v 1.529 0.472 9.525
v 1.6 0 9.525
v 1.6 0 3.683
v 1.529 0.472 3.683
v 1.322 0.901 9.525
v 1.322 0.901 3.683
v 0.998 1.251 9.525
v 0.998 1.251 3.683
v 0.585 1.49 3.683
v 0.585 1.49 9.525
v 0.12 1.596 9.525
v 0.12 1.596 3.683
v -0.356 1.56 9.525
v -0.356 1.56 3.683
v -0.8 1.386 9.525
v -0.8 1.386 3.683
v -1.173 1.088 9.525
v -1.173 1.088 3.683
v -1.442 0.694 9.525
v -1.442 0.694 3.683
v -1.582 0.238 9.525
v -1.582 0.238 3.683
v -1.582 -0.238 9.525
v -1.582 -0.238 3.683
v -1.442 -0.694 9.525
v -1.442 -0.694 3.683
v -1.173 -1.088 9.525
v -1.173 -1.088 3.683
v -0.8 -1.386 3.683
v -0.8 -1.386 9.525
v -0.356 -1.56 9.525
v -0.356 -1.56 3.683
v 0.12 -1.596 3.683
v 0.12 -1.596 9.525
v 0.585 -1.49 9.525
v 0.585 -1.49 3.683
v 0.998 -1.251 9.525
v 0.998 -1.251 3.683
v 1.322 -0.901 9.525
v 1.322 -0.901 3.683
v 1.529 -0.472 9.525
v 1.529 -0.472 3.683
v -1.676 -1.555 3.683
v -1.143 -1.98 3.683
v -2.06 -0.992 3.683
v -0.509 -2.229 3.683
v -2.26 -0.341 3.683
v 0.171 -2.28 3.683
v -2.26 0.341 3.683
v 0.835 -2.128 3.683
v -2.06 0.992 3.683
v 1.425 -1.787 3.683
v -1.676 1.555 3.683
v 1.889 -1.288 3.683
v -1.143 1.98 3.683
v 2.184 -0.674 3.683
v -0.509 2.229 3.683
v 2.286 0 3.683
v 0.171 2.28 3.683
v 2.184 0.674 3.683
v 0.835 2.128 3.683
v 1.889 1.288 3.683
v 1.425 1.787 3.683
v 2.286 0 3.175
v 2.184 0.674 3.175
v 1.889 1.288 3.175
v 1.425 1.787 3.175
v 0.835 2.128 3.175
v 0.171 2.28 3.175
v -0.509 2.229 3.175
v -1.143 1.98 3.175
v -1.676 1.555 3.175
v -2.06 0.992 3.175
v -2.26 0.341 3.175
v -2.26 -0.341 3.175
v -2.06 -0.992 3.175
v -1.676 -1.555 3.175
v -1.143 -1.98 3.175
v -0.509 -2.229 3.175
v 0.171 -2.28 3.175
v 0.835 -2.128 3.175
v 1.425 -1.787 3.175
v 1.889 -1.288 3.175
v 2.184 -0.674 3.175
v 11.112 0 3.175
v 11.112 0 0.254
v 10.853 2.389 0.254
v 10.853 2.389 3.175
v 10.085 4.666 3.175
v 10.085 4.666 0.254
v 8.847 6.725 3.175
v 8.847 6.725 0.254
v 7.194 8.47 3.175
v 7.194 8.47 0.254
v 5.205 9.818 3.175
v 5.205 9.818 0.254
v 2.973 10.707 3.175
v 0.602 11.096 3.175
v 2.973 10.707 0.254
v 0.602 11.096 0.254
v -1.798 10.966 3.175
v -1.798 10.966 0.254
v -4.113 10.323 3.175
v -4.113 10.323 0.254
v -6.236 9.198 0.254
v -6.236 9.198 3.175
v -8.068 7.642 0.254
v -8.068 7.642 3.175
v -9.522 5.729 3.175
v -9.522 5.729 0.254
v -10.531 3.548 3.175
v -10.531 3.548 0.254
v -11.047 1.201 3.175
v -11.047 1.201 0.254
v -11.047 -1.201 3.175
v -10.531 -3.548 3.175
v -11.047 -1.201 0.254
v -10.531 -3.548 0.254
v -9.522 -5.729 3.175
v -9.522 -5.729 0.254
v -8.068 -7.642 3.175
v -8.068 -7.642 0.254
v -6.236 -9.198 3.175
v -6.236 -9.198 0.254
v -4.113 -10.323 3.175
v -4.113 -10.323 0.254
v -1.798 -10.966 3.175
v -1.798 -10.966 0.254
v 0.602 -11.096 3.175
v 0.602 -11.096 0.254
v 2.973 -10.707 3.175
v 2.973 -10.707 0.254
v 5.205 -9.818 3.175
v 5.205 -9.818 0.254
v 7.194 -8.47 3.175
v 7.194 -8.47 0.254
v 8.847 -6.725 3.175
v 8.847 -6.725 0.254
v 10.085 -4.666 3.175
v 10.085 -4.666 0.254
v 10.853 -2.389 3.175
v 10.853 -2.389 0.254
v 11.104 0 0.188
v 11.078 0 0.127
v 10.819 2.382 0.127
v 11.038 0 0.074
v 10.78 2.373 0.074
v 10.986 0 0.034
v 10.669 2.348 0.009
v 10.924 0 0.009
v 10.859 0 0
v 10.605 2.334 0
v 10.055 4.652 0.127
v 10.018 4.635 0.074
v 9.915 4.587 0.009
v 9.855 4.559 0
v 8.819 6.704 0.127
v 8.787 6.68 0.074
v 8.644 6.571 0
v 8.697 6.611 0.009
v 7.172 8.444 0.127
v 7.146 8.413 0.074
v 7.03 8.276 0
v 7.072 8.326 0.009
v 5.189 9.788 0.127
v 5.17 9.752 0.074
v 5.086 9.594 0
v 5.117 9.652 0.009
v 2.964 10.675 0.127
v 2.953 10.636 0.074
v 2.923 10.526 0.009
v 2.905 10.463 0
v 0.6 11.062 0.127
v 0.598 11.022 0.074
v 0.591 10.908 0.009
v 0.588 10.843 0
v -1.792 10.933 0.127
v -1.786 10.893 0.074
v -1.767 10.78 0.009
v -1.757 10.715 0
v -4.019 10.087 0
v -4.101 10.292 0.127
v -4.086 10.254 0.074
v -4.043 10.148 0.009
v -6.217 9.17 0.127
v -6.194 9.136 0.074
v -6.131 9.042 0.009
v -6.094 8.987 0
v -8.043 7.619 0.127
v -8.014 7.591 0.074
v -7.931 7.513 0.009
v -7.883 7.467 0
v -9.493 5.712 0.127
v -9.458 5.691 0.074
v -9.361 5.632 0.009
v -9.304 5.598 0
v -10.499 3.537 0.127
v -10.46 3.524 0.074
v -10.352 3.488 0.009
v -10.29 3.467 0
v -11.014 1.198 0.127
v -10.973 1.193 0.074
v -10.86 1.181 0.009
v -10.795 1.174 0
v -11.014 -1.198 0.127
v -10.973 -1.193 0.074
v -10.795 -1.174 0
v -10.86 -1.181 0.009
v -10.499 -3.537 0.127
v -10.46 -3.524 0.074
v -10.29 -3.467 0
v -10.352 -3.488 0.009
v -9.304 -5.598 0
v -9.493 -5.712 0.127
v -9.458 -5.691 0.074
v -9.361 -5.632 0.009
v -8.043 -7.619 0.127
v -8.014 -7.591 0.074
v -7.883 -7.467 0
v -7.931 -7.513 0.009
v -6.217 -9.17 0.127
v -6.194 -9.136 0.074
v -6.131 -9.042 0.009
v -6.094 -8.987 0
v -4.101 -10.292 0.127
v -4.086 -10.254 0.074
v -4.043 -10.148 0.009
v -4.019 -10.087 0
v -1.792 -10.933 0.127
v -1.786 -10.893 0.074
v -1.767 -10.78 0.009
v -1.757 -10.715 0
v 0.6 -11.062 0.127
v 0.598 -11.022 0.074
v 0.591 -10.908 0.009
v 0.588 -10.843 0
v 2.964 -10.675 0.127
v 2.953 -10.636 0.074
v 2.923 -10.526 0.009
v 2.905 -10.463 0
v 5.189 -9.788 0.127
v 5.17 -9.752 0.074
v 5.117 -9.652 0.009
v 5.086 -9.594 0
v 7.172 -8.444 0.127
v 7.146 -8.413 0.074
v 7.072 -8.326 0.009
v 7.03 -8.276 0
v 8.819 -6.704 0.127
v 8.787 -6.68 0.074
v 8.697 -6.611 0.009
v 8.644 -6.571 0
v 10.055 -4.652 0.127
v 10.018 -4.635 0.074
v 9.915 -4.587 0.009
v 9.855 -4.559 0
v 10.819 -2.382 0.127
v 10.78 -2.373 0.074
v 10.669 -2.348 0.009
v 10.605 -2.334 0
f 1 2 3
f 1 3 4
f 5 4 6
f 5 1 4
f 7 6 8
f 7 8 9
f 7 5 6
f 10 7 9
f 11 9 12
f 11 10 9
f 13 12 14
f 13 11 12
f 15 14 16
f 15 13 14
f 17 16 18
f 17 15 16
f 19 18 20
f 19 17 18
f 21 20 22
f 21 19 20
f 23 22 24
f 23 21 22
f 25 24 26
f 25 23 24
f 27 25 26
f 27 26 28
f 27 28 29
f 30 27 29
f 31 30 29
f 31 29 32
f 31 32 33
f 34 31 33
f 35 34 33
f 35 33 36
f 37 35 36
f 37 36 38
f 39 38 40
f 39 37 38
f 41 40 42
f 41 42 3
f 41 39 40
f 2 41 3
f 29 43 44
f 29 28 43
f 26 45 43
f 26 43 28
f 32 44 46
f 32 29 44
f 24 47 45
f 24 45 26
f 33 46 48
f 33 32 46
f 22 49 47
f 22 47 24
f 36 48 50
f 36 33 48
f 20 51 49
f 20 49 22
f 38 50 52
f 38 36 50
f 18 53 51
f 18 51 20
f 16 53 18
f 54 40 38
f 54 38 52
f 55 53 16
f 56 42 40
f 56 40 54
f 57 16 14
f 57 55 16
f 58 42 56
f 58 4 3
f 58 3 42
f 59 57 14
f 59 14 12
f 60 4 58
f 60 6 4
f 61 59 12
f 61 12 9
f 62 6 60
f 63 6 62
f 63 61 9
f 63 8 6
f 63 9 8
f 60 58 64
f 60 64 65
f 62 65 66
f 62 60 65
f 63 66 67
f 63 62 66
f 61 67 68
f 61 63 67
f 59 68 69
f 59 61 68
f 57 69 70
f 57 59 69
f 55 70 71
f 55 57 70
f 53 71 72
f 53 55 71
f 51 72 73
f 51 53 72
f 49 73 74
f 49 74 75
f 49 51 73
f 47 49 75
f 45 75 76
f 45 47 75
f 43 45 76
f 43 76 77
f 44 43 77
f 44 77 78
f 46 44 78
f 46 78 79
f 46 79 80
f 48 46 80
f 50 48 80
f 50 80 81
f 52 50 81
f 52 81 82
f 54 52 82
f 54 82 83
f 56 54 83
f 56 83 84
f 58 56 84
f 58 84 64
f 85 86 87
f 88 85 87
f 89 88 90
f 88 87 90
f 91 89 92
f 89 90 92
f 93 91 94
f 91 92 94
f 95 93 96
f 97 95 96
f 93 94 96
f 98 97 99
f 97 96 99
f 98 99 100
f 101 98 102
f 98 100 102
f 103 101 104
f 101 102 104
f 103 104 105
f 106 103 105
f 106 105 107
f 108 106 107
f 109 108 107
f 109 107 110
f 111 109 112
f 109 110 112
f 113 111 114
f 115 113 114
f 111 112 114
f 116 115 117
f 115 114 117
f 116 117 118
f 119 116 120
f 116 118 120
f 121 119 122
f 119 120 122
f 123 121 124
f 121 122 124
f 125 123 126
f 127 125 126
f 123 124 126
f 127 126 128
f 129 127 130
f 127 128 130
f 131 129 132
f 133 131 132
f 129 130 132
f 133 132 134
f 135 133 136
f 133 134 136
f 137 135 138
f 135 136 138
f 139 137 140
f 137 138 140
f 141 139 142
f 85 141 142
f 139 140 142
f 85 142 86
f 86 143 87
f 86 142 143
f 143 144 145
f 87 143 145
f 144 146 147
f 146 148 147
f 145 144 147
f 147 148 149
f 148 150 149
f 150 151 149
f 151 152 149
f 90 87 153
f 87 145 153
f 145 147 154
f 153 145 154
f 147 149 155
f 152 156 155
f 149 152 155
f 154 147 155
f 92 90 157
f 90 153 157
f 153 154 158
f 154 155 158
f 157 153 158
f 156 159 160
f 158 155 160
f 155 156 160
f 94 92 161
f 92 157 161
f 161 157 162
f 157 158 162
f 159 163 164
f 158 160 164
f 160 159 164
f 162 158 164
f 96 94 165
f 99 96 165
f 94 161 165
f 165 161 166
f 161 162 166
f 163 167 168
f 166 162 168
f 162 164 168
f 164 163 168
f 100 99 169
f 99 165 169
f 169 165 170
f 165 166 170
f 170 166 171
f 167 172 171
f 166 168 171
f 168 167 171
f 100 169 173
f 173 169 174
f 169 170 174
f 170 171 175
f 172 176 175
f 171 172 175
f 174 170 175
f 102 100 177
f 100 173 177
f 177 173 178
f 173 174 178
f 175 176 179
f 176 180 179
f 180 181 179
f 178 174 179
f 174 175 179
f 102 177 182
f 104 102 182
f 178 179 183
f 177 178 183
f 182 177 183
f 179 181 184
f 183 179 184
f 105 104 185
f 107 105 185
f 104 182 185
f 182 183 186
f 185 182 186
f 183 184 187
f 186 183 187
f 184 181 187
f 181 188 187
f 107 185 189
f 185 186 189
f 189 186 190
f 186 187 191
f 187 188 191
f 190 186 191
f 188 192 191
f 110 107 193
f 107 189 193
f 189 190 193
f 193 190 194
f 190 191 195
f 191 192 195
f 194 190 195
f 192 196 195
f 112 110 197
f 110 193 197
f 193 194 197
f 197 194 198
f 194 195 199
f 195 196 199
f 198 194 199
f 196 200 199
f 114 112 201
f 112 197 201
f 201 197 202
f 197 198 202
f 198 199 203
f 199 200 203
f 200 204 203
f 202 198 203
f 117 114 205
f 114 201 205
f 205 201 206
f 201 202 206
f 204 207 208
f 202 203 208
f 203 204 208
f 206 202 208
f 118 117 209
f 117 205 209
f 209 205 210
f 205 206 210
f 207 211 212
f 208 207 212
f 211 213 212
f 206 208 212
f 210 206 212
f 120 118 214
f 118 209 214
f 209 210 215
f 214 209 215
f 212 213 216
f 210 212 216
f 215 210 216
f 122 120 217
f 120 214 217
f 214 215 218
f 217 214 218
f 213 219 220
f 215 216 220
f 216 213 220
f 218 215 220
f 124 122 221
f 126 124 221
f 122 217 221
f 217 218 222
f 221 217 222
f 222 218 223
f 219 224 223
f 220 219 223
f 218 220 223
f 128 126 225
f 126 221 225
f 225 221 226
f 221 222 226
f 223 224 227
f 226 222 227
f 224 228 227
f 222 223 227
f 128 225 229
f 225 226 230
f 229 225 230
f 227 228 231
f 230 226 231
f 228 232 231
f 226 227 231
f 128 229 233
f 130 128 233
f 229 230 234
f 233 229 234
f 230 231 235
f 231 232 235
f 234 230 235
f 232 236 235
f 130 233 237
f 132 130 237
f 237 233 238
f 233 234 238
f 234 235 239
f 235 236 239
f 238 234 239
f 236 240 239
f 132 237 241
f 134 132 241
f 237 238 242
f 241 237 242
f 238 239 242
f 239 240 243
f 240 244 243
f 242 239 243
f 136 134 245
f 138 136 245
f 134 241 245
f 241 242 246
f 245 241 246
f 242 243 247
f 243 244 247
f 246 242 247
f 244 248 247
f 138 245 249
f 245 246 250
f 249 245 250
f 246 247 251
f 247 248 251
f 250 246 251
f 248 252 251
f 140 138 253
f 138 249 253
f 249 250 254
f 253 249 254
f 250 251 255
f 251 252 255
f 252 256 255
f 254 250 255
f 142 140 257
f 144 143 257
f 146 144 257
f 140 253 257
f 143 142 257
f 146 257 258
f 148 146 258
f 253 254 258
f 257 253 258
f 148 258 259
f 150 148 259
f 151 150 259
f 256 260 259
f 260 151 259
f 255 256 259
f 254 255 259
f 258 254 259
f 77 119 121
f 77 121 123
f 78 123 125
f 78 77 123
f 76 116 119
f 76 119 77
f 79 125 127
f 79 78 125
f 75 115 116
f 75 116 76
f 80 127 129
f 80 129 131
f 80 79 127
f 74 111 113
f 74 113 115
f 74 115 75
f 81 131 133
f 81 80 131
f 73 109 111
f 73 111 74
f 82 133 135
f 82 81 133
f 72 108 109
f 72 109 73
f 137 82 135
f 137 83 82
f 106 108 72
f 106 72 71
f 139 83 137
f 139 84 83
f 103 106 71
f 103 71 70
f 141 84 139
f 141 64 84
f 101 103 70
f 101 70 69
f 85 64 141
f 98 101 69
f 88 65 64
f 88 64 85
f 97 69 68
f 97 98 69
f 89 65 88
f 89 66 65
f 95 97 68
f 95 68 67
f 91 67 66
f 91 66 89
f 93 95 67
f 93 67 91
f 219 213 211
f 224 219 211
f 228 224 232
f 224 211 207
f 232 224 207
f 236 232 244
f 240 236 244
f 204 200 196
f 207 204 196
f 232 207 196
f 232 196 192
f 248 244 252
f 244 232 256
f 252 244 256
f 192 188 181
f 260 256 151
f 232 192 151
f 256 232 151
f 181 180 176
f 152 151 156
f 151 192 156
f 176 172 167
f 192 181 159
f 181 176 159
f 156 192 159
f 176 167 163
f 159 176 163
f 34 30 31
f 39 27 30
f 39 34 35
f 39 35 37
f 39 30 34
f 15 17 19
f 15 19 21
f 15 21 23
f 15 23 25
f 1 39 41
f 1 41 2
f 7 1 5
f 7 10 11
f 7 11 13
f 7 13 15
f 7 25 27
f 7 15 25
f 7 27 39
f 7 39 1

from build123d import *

# Parameters (mm, degrees)
F0_R     = 1.6002
F1_DEPTH = 9.525
F0_R_2   = 11.1125
F2_DEPTH = 3.175
F3_R     = 0.254
F4_R     = 2.286
F4_R_2   = 1.6002
F5_DEPTH = 6.35
F6_R     = 2.286
F6_R_2   = 1.6002
F7_DEPTH = 5.842


with BuildPart() as f1:
    # F0 (on Top) → F1 (new body)
    with BuildSketch(Plane.XY):
        Circle(F0_R)
    extrude(amount=F1_DEPTH)

    # F0 (on Top) → F2 (join)
    with BuildSketch(Plane.XY):
        Circle(F0_R_2)
        Circle(F0_R, mode=Mode.SUBTRACT)
    extrude(amount=F2_DEPTH)

    # F3
    f3_edges = [f1.edges().sort_by_distance(p)[0] for p in [
        (-11.1125, 0, 0),
    ]]
    fillet(f3_edges, radius=F3_R)

    # F4 (on face) → F5 (join)
    with BuildSketch(Plane.XY.offset(9.525)):
        Circle(F4_R)
        Circle(F4_R_2, mode=Mode.SUBTRACT)
    extrude(amount=-F5_DEPTH)

    # F6 (on face) → F7 (cut)
    with BuildSketch(Plane.XY.offset(9.525)):
        Circle(F6_R)
        Circle(F6_R_2, mode=Mode.SUBTRACT)
    extrude(amount=-F7_DEPTH, mode=Mode.SUBTRACT)


solid = f1.part
